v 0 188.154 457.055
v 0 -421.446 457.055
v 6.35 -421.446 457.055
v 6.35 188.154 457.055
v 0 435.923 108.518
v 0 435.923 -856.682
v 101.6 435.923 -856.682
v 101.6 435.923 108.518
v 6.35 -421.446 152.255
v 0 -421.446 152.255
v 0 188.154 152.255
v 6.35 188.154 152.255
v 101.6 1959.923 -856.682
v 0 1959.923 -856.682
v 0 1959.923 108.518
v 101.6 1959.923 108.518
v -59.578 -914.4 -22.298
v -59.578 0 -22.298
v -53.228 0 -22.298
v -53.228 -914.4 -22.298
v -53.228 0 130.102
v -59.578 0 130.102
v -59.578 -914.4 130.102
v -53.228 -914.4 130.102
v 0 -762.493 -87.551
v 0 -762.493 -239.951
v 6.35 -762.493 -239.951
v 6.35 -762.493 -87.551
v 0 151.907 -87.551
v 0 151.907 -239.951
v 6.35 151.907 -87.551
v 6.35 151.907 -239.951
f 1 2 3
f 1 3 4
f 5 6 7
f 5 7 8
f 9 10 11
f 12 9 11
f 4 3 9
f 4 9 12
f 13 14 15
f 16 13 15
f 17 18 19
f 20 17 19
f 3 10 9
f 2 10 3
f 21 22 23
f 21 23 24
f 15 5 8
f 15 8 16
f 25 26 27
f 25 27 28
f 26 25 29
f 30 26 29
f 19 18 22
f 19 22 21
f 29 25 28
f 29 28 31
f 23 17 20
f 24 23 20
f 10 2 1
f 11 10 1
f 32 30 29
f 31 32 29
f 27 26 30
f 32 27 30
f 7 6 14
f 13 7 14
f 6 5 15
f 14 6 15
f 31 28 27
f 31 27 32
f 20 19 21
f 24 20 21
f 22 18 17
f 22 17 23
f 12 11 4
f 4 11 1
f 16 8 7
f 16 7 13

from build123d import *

# Parameters (mm, degrees)
F0_W     = 6.35
F0_H     = 152.4
F1_DEPTH = 914.4
F2_W     = 914.4
F2_H     = 152.4
F3_DEPTH = 6.35
F4_W     = 609.6
F4_H     = 304.8
F5_DEPTH = 6.35
F6_W     = 1524
F6_H     = 965.2
F7_DEPTH = 101.6


with BuildPart() as f1:
    # F0 (on Front) → F1 (new body)
    with BuildSketch(Plane.XZ):
        with Locations((-56.403234, 53.902188)):
            Rectangle(F0_W, F0_H)
    extrude(amount=F1_DEPTH)


with BuildPart() as f3:
    # F2 (on Right) → F3 (new body)
    with BuildSketch(Plane.YZ):
        with Locations((-305.293286, -163.750612)):
            Rectangle(F2_W, F2_H)
    extrude(amount=F3_DEPTH)


with BuildPart() as f5:
    # F4 (on Right) → F5 (new body)
    with BuildSketch(Plane.YZ):
        with Locations((-116.646115, 304.655163)):
            Rectangle(F4_W, F4_H)
    extrude(amount=F5_DEPTH)


with BuildPart() as f7:
    # F6 (on Right) → F7 (new body)
    with BuildSketch(Plane.YZ):
        with Locations((1197.923457, -374.081705)):
            Rectangle(F6_W, F6_H)
    extrude(amount=F7_DEPTH)


solid = Compound([f1.part, f3.part, f5.part, f7.part])
